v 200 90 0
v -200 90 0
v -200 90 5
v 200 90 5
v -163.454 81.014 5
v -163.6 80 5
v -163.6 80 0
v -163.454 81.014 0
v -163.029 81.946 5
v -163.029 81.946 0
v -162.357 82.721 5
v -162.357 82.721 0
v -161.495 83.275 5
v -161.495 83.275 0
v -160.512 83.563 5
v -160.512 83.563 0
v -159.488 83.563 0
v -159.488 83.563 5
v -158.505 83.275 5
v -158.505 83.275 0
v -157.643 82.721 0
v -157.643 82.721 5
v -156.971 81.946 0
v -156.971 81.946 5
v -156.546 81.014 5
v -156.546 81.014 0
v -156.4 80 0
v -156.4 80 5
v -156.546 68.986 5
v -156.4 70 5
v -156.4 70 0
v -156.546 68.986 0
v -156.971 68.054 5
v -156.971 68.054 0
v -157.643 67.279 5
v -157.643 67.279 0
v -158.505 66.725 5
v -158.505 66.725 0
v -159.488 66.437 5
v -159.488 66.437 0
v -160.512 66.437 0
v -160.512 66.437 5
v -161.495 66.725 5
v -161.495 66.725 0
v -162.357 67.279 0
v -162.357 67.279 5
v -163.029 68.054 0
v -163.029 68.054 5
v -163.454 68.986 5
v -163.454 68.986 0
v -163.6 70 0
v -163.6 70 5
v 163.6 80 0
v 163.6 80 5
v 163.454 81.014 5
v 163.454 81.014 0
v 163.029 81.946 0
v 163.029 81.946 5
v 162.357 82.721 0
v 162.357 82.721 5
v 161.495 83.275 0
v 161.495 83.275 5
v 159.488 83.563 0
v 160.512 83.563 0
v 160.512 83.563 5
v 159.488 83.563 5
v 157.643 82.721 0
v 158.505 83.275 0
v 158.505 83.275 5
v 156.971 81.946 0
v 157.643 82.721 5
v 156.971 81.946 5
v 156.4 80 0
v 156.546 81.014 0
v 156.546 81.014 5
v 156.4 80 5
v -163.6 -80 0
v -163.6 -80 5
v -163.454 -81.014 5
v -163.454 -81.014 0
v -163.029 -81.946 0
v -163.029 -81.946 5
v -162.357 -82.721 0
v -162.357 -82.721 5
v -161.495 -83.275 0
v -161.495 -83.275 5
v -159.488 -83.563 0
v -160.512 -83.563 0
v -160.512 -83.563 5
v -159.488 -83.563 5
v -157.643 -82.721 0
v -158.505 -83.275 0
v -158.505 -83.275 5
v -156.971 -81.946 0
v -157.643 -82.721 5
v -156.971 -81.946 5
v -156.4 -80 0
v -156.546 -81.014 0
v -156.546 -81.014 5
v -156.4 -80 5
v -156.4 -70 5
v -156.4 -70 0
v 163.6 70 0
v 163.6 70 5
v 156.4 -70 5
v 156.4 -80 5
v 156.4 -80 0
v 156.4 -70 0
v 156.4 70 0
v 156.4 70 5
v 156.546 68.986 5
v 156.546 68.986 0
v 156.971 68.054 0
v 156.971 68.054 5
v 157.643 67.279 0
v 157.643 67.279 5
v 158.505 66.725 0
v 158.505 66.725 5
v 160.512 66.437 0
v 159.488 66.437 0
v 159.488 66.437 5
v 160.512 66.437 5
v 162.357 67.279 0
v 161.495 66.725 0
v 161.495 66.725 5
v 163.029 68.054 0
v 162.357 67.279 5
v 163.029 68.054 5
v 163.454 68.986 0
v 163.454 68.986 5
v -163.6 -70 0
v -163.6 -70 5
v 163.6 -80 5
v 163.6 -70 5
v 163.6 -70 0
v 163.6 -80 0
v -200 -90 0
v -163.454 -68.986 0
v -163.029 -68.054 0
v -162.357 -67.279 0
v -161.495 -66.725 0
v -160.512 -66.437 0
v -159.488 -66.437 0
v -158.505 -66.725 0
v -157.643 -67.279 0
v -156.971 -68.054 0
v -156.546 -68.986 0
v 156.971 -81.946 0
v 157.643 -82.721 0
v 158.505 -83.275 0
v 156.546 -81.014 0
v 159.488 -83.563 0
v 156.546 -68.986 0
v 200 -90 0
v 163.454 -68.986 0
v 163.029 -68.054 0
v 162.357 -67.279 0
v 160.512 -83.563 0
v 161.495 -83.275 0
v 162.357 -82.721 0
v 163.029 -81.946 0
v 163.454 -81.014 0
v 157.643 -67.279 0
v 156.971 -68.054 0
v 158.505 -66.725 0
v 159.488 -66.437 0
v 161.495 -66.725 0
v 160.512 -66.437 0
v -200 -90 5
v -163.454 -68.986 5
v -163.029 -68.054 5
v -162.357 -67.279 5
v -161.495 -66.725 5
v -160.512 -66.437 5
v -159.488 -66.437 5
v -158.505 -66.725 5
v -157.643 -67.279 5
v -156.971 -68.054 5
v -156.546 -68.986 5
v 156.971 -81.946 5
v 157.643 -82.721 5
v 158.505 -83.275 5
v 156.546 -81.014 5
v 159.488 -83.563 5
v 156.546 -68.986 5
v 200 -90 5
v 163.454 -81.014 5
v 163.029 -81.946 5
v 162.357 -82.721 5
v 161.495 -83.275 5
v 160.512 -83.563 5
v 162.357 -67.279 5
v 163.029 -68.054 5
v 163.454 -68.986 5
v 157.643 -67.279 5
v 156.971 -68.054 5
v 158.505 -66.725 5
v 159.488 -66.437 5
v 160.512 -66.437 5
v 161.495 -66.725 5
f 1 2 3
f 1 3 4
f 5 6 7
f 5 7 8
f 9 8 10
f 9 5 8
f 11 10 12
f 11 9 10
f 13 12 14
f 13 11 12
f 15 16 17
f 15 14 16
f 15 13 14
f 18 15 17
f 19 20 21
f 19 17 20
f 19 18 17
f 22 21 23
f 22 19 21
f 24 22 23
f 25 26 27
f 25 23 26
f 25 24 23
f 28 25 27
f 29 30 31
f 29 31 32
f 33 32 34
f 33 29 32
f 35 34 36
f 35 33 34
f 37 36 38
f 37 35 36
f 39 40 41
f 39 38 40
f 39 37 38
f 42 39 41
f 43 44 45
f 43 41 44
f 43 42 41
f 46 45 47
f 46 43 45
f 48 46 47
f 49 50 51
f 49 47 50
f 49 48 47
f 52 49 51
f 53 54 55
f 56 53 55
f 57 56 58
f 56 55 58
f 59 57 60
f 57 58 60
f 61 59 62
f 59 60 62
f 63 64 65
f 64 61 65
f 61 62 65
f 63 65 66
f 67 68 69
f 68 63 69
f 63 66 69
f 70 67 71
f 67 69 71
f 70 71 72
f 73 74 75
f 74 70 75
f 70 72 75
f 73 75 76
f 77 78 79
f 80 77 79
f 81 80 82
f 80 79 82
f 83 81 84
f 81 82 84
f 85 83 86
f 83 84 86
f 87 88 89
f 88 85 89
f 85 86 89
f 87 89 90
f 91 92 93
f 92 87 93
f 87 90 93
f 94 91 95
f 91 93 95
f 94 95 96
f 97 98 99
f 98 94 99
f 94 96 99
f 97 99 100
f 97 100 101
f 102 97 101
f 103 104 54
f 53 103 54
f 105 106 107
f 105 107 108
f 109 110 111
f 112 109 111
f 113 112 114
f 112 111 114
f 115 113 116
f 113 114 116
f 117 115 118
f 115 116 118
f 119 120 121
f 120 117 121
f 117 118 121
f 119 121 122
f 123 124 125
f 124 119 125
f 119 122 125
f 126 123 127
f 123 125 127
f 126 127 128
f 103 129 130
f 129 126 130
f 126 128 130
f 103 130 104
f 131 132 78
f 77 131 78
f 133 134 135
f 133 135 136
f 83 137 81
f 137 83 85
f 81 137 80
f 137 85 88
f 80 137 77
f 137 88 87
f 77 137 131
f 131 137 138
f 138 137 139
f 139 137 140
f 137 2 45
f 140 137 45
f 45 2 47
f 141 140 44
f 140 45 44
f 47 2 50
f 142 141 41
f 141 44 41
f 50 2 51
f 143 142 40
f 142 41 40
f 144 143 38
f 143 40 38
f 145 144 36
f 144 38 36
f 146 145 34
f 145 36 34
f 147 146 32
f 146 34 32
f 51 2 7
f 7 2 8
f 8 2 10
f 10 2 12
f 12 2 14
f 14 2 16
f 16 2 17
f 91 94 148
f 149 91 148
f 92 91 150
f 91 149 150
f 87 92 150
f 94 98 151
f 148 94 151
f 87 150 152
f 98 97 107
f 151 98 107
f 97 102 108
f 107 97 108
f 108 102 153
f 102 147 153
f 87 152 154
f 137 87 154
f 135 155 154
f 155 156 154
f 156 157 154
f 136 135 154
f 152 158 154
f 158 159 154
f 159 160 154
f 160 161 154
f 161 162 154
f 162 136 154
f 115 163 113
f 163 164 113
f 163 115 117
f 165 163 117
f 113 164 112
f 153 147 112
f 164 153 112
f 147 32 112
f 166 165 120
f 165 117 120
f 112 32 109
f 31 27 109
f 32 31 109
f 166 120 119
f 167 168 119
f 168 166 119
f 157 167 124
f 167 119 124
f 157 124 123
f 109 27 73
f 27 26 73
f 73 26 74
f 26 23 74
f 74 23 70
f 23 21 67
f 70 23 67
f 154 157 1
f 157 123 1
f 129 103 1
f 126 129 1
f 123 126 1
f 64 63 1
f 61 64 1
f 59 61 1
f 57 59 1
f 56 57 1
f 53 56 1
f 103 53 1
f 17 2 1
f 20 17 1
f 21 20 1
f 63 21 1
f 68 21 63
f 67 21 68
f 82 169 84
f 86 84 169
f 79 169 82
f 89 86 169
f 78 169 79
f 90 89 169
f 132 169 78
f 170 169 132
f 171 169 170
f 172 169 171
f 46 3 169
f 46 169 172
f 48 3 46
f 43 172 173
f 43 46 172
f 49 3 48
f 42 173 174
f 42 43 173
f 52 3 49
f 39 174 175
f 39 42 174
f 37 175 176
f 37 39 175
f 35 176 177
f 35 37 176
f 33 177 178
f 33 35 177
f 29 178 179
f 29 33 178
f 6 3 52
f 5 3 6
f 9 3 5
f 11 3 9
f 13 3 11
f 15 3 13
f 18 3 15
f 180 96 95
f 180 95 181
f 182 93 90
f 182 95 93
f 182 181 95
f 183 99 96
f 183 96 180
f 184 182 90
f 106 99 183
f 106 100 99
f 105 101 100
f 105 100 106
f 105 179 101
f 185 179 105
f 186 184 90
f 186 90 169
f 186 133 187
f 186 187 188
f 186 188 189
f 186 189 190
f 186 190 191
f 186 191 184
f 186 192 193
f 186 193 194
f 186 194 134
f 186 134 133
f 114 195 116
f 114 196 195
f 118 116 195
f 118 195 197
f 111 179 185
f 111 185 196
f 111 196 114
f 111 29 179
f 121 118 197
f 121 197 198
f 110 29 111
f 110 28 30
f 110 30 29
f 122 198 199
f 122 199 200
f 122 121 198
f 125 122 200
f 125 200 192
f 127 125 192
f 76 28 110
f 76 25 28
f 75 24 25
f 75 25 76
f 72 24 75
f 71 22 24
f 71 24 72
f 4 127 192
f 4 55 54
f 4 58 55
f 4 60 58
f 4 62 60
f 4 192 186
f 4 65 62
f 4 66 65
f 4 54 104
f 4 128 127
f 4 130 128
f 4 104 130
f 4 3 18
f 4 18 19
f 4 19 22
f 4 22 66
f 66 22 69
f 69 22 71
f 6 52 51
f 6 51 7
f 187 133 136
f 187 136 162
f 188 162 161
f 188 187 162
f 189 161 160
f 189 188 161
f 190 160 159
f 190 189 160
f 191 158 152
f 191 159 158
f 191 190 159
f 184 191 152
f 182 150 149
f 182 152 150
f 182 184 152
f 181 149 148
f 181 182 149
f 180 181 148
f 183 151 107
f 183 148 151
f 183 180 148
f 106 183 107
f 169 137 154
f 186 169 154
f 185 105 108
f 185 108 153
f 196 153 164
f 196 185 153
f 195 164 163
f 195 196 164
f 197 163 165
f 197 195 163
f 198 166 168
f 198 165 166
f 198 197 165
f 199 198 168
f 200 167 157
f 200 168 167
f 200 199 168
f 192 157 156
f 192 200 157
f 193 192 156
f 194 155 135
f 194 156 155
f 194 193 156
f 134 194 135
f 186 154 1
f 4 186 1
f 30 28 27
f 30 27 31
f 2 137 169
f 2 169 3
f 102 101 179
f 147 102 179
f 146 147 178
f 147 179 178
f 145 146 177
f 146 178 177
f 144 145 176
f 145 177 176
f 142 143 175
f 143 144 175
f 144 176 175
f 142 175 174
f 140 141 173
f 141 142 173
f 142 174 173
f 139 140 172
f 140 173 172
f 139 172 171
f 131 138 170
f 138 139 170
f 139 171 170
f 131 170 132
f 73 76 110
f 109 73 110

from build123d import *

# Parameters (mm, degrees)
SKETCH2_W                                = 400
SKETCH2_H                                = 180
BOSS_EXTRUDE1_DEPTH                      = 5
CUT_EXTRUDE1_REACH                       = 221.374
MIRROR1_AT_THE_SECOND_PLANE_COPY_1_REACH = 221.374


with BuildPart() as part:
    # Sketch2 → Boss-Extrude1 (new body)
    with BuildSketch(Plane.XY):
        Rectangle(SKETCH2_W, SKETCH2_H)
    extrude(amount=BOSS_EXTRUDE1_DEPTH)

    # Sketch3 → Cut-Extrude1 (cut, up to next)
    with BuildSketch(Plane.XY.offset(5), mode=Mode.PRIVATE) as cut_extrude1_sk1:
        with BuildLine():
            Line((-156.4, 80), (-156.4, 70))
            ThreePointArc((-156.4, 70), (-160, 66.4), (-163.6, 70))
            Line((-163.6, 70), (-163.6, 80))
            ThreePointArc((-163.6, 80), (-160, 83.6), (-156.4, 80))
        make_face()
    cut_extrude1_tool1 = extrude(cut_extrude1_sk1.sketch, amount=-CUT_EXTRUDE1_REACH, mode=Mode.PRIVATE) & part.part
    cut_extrude1 = cut_extrude1_tool1.solids().sort_by_distance((-160, 75, 5))[0]
    add(cut_extrude1, mode=Mode.SUBTRACT)

    # Mirror1: Cut-Extrude1 across plane
    add(cut_extrude1.mirror(Plane.ZX), mode=Mode.SUBTRACT)

    # Mirror1 at the second plane: Cut-Extrude1 across plane
    add(cut_extrude1.mirror(Plane(origin=(0, 0, 0), x_dir=(0, 0, 1), z_dir=(1, 0, 0))), mode=Mode.SUBTRACT)

    # Mirror1 at the second plane copy 1 sketc → Mirror1 at the second plane copy 1 (cut, up to next)
    with BuildSketch(Plane(origin=(0, 0, 5), x_dir=(-1, 0, 0), z_dir=(0, 0, 1)), mode=Mode.PRIVATE) as mirror1_at_the_second_plane_copy_1_sk1:
        with BuildLine():
            Line((-156.4, 80), (-156.4, 70))
            ThreePointArc((-156.4, 70), (-160, 66.4), (-163.6, 70))
            Line((-163.6, 70), (-163.6, 80))
            ThreePointArc((-163.6, 80), (-160, 83.6), (-156.4, 80))
        make_face()
    mirror1_at_the_second_plane_copy_1_tool1 = extrude(mirror1_at_the_second_plane_copy_1_sk1.sketch, amount=-MIRROR1_AT_THE_SECOND_PLANE_COPY_1_REACH, mode=Mode.PRIVATE) & part.part
    add(mirror1_at_the_second_plane_copy_1_tool1.solids().sort_by_distance((160, -75, 5))[0], mode=Mode.SUBTRACT)


solid = part.part
